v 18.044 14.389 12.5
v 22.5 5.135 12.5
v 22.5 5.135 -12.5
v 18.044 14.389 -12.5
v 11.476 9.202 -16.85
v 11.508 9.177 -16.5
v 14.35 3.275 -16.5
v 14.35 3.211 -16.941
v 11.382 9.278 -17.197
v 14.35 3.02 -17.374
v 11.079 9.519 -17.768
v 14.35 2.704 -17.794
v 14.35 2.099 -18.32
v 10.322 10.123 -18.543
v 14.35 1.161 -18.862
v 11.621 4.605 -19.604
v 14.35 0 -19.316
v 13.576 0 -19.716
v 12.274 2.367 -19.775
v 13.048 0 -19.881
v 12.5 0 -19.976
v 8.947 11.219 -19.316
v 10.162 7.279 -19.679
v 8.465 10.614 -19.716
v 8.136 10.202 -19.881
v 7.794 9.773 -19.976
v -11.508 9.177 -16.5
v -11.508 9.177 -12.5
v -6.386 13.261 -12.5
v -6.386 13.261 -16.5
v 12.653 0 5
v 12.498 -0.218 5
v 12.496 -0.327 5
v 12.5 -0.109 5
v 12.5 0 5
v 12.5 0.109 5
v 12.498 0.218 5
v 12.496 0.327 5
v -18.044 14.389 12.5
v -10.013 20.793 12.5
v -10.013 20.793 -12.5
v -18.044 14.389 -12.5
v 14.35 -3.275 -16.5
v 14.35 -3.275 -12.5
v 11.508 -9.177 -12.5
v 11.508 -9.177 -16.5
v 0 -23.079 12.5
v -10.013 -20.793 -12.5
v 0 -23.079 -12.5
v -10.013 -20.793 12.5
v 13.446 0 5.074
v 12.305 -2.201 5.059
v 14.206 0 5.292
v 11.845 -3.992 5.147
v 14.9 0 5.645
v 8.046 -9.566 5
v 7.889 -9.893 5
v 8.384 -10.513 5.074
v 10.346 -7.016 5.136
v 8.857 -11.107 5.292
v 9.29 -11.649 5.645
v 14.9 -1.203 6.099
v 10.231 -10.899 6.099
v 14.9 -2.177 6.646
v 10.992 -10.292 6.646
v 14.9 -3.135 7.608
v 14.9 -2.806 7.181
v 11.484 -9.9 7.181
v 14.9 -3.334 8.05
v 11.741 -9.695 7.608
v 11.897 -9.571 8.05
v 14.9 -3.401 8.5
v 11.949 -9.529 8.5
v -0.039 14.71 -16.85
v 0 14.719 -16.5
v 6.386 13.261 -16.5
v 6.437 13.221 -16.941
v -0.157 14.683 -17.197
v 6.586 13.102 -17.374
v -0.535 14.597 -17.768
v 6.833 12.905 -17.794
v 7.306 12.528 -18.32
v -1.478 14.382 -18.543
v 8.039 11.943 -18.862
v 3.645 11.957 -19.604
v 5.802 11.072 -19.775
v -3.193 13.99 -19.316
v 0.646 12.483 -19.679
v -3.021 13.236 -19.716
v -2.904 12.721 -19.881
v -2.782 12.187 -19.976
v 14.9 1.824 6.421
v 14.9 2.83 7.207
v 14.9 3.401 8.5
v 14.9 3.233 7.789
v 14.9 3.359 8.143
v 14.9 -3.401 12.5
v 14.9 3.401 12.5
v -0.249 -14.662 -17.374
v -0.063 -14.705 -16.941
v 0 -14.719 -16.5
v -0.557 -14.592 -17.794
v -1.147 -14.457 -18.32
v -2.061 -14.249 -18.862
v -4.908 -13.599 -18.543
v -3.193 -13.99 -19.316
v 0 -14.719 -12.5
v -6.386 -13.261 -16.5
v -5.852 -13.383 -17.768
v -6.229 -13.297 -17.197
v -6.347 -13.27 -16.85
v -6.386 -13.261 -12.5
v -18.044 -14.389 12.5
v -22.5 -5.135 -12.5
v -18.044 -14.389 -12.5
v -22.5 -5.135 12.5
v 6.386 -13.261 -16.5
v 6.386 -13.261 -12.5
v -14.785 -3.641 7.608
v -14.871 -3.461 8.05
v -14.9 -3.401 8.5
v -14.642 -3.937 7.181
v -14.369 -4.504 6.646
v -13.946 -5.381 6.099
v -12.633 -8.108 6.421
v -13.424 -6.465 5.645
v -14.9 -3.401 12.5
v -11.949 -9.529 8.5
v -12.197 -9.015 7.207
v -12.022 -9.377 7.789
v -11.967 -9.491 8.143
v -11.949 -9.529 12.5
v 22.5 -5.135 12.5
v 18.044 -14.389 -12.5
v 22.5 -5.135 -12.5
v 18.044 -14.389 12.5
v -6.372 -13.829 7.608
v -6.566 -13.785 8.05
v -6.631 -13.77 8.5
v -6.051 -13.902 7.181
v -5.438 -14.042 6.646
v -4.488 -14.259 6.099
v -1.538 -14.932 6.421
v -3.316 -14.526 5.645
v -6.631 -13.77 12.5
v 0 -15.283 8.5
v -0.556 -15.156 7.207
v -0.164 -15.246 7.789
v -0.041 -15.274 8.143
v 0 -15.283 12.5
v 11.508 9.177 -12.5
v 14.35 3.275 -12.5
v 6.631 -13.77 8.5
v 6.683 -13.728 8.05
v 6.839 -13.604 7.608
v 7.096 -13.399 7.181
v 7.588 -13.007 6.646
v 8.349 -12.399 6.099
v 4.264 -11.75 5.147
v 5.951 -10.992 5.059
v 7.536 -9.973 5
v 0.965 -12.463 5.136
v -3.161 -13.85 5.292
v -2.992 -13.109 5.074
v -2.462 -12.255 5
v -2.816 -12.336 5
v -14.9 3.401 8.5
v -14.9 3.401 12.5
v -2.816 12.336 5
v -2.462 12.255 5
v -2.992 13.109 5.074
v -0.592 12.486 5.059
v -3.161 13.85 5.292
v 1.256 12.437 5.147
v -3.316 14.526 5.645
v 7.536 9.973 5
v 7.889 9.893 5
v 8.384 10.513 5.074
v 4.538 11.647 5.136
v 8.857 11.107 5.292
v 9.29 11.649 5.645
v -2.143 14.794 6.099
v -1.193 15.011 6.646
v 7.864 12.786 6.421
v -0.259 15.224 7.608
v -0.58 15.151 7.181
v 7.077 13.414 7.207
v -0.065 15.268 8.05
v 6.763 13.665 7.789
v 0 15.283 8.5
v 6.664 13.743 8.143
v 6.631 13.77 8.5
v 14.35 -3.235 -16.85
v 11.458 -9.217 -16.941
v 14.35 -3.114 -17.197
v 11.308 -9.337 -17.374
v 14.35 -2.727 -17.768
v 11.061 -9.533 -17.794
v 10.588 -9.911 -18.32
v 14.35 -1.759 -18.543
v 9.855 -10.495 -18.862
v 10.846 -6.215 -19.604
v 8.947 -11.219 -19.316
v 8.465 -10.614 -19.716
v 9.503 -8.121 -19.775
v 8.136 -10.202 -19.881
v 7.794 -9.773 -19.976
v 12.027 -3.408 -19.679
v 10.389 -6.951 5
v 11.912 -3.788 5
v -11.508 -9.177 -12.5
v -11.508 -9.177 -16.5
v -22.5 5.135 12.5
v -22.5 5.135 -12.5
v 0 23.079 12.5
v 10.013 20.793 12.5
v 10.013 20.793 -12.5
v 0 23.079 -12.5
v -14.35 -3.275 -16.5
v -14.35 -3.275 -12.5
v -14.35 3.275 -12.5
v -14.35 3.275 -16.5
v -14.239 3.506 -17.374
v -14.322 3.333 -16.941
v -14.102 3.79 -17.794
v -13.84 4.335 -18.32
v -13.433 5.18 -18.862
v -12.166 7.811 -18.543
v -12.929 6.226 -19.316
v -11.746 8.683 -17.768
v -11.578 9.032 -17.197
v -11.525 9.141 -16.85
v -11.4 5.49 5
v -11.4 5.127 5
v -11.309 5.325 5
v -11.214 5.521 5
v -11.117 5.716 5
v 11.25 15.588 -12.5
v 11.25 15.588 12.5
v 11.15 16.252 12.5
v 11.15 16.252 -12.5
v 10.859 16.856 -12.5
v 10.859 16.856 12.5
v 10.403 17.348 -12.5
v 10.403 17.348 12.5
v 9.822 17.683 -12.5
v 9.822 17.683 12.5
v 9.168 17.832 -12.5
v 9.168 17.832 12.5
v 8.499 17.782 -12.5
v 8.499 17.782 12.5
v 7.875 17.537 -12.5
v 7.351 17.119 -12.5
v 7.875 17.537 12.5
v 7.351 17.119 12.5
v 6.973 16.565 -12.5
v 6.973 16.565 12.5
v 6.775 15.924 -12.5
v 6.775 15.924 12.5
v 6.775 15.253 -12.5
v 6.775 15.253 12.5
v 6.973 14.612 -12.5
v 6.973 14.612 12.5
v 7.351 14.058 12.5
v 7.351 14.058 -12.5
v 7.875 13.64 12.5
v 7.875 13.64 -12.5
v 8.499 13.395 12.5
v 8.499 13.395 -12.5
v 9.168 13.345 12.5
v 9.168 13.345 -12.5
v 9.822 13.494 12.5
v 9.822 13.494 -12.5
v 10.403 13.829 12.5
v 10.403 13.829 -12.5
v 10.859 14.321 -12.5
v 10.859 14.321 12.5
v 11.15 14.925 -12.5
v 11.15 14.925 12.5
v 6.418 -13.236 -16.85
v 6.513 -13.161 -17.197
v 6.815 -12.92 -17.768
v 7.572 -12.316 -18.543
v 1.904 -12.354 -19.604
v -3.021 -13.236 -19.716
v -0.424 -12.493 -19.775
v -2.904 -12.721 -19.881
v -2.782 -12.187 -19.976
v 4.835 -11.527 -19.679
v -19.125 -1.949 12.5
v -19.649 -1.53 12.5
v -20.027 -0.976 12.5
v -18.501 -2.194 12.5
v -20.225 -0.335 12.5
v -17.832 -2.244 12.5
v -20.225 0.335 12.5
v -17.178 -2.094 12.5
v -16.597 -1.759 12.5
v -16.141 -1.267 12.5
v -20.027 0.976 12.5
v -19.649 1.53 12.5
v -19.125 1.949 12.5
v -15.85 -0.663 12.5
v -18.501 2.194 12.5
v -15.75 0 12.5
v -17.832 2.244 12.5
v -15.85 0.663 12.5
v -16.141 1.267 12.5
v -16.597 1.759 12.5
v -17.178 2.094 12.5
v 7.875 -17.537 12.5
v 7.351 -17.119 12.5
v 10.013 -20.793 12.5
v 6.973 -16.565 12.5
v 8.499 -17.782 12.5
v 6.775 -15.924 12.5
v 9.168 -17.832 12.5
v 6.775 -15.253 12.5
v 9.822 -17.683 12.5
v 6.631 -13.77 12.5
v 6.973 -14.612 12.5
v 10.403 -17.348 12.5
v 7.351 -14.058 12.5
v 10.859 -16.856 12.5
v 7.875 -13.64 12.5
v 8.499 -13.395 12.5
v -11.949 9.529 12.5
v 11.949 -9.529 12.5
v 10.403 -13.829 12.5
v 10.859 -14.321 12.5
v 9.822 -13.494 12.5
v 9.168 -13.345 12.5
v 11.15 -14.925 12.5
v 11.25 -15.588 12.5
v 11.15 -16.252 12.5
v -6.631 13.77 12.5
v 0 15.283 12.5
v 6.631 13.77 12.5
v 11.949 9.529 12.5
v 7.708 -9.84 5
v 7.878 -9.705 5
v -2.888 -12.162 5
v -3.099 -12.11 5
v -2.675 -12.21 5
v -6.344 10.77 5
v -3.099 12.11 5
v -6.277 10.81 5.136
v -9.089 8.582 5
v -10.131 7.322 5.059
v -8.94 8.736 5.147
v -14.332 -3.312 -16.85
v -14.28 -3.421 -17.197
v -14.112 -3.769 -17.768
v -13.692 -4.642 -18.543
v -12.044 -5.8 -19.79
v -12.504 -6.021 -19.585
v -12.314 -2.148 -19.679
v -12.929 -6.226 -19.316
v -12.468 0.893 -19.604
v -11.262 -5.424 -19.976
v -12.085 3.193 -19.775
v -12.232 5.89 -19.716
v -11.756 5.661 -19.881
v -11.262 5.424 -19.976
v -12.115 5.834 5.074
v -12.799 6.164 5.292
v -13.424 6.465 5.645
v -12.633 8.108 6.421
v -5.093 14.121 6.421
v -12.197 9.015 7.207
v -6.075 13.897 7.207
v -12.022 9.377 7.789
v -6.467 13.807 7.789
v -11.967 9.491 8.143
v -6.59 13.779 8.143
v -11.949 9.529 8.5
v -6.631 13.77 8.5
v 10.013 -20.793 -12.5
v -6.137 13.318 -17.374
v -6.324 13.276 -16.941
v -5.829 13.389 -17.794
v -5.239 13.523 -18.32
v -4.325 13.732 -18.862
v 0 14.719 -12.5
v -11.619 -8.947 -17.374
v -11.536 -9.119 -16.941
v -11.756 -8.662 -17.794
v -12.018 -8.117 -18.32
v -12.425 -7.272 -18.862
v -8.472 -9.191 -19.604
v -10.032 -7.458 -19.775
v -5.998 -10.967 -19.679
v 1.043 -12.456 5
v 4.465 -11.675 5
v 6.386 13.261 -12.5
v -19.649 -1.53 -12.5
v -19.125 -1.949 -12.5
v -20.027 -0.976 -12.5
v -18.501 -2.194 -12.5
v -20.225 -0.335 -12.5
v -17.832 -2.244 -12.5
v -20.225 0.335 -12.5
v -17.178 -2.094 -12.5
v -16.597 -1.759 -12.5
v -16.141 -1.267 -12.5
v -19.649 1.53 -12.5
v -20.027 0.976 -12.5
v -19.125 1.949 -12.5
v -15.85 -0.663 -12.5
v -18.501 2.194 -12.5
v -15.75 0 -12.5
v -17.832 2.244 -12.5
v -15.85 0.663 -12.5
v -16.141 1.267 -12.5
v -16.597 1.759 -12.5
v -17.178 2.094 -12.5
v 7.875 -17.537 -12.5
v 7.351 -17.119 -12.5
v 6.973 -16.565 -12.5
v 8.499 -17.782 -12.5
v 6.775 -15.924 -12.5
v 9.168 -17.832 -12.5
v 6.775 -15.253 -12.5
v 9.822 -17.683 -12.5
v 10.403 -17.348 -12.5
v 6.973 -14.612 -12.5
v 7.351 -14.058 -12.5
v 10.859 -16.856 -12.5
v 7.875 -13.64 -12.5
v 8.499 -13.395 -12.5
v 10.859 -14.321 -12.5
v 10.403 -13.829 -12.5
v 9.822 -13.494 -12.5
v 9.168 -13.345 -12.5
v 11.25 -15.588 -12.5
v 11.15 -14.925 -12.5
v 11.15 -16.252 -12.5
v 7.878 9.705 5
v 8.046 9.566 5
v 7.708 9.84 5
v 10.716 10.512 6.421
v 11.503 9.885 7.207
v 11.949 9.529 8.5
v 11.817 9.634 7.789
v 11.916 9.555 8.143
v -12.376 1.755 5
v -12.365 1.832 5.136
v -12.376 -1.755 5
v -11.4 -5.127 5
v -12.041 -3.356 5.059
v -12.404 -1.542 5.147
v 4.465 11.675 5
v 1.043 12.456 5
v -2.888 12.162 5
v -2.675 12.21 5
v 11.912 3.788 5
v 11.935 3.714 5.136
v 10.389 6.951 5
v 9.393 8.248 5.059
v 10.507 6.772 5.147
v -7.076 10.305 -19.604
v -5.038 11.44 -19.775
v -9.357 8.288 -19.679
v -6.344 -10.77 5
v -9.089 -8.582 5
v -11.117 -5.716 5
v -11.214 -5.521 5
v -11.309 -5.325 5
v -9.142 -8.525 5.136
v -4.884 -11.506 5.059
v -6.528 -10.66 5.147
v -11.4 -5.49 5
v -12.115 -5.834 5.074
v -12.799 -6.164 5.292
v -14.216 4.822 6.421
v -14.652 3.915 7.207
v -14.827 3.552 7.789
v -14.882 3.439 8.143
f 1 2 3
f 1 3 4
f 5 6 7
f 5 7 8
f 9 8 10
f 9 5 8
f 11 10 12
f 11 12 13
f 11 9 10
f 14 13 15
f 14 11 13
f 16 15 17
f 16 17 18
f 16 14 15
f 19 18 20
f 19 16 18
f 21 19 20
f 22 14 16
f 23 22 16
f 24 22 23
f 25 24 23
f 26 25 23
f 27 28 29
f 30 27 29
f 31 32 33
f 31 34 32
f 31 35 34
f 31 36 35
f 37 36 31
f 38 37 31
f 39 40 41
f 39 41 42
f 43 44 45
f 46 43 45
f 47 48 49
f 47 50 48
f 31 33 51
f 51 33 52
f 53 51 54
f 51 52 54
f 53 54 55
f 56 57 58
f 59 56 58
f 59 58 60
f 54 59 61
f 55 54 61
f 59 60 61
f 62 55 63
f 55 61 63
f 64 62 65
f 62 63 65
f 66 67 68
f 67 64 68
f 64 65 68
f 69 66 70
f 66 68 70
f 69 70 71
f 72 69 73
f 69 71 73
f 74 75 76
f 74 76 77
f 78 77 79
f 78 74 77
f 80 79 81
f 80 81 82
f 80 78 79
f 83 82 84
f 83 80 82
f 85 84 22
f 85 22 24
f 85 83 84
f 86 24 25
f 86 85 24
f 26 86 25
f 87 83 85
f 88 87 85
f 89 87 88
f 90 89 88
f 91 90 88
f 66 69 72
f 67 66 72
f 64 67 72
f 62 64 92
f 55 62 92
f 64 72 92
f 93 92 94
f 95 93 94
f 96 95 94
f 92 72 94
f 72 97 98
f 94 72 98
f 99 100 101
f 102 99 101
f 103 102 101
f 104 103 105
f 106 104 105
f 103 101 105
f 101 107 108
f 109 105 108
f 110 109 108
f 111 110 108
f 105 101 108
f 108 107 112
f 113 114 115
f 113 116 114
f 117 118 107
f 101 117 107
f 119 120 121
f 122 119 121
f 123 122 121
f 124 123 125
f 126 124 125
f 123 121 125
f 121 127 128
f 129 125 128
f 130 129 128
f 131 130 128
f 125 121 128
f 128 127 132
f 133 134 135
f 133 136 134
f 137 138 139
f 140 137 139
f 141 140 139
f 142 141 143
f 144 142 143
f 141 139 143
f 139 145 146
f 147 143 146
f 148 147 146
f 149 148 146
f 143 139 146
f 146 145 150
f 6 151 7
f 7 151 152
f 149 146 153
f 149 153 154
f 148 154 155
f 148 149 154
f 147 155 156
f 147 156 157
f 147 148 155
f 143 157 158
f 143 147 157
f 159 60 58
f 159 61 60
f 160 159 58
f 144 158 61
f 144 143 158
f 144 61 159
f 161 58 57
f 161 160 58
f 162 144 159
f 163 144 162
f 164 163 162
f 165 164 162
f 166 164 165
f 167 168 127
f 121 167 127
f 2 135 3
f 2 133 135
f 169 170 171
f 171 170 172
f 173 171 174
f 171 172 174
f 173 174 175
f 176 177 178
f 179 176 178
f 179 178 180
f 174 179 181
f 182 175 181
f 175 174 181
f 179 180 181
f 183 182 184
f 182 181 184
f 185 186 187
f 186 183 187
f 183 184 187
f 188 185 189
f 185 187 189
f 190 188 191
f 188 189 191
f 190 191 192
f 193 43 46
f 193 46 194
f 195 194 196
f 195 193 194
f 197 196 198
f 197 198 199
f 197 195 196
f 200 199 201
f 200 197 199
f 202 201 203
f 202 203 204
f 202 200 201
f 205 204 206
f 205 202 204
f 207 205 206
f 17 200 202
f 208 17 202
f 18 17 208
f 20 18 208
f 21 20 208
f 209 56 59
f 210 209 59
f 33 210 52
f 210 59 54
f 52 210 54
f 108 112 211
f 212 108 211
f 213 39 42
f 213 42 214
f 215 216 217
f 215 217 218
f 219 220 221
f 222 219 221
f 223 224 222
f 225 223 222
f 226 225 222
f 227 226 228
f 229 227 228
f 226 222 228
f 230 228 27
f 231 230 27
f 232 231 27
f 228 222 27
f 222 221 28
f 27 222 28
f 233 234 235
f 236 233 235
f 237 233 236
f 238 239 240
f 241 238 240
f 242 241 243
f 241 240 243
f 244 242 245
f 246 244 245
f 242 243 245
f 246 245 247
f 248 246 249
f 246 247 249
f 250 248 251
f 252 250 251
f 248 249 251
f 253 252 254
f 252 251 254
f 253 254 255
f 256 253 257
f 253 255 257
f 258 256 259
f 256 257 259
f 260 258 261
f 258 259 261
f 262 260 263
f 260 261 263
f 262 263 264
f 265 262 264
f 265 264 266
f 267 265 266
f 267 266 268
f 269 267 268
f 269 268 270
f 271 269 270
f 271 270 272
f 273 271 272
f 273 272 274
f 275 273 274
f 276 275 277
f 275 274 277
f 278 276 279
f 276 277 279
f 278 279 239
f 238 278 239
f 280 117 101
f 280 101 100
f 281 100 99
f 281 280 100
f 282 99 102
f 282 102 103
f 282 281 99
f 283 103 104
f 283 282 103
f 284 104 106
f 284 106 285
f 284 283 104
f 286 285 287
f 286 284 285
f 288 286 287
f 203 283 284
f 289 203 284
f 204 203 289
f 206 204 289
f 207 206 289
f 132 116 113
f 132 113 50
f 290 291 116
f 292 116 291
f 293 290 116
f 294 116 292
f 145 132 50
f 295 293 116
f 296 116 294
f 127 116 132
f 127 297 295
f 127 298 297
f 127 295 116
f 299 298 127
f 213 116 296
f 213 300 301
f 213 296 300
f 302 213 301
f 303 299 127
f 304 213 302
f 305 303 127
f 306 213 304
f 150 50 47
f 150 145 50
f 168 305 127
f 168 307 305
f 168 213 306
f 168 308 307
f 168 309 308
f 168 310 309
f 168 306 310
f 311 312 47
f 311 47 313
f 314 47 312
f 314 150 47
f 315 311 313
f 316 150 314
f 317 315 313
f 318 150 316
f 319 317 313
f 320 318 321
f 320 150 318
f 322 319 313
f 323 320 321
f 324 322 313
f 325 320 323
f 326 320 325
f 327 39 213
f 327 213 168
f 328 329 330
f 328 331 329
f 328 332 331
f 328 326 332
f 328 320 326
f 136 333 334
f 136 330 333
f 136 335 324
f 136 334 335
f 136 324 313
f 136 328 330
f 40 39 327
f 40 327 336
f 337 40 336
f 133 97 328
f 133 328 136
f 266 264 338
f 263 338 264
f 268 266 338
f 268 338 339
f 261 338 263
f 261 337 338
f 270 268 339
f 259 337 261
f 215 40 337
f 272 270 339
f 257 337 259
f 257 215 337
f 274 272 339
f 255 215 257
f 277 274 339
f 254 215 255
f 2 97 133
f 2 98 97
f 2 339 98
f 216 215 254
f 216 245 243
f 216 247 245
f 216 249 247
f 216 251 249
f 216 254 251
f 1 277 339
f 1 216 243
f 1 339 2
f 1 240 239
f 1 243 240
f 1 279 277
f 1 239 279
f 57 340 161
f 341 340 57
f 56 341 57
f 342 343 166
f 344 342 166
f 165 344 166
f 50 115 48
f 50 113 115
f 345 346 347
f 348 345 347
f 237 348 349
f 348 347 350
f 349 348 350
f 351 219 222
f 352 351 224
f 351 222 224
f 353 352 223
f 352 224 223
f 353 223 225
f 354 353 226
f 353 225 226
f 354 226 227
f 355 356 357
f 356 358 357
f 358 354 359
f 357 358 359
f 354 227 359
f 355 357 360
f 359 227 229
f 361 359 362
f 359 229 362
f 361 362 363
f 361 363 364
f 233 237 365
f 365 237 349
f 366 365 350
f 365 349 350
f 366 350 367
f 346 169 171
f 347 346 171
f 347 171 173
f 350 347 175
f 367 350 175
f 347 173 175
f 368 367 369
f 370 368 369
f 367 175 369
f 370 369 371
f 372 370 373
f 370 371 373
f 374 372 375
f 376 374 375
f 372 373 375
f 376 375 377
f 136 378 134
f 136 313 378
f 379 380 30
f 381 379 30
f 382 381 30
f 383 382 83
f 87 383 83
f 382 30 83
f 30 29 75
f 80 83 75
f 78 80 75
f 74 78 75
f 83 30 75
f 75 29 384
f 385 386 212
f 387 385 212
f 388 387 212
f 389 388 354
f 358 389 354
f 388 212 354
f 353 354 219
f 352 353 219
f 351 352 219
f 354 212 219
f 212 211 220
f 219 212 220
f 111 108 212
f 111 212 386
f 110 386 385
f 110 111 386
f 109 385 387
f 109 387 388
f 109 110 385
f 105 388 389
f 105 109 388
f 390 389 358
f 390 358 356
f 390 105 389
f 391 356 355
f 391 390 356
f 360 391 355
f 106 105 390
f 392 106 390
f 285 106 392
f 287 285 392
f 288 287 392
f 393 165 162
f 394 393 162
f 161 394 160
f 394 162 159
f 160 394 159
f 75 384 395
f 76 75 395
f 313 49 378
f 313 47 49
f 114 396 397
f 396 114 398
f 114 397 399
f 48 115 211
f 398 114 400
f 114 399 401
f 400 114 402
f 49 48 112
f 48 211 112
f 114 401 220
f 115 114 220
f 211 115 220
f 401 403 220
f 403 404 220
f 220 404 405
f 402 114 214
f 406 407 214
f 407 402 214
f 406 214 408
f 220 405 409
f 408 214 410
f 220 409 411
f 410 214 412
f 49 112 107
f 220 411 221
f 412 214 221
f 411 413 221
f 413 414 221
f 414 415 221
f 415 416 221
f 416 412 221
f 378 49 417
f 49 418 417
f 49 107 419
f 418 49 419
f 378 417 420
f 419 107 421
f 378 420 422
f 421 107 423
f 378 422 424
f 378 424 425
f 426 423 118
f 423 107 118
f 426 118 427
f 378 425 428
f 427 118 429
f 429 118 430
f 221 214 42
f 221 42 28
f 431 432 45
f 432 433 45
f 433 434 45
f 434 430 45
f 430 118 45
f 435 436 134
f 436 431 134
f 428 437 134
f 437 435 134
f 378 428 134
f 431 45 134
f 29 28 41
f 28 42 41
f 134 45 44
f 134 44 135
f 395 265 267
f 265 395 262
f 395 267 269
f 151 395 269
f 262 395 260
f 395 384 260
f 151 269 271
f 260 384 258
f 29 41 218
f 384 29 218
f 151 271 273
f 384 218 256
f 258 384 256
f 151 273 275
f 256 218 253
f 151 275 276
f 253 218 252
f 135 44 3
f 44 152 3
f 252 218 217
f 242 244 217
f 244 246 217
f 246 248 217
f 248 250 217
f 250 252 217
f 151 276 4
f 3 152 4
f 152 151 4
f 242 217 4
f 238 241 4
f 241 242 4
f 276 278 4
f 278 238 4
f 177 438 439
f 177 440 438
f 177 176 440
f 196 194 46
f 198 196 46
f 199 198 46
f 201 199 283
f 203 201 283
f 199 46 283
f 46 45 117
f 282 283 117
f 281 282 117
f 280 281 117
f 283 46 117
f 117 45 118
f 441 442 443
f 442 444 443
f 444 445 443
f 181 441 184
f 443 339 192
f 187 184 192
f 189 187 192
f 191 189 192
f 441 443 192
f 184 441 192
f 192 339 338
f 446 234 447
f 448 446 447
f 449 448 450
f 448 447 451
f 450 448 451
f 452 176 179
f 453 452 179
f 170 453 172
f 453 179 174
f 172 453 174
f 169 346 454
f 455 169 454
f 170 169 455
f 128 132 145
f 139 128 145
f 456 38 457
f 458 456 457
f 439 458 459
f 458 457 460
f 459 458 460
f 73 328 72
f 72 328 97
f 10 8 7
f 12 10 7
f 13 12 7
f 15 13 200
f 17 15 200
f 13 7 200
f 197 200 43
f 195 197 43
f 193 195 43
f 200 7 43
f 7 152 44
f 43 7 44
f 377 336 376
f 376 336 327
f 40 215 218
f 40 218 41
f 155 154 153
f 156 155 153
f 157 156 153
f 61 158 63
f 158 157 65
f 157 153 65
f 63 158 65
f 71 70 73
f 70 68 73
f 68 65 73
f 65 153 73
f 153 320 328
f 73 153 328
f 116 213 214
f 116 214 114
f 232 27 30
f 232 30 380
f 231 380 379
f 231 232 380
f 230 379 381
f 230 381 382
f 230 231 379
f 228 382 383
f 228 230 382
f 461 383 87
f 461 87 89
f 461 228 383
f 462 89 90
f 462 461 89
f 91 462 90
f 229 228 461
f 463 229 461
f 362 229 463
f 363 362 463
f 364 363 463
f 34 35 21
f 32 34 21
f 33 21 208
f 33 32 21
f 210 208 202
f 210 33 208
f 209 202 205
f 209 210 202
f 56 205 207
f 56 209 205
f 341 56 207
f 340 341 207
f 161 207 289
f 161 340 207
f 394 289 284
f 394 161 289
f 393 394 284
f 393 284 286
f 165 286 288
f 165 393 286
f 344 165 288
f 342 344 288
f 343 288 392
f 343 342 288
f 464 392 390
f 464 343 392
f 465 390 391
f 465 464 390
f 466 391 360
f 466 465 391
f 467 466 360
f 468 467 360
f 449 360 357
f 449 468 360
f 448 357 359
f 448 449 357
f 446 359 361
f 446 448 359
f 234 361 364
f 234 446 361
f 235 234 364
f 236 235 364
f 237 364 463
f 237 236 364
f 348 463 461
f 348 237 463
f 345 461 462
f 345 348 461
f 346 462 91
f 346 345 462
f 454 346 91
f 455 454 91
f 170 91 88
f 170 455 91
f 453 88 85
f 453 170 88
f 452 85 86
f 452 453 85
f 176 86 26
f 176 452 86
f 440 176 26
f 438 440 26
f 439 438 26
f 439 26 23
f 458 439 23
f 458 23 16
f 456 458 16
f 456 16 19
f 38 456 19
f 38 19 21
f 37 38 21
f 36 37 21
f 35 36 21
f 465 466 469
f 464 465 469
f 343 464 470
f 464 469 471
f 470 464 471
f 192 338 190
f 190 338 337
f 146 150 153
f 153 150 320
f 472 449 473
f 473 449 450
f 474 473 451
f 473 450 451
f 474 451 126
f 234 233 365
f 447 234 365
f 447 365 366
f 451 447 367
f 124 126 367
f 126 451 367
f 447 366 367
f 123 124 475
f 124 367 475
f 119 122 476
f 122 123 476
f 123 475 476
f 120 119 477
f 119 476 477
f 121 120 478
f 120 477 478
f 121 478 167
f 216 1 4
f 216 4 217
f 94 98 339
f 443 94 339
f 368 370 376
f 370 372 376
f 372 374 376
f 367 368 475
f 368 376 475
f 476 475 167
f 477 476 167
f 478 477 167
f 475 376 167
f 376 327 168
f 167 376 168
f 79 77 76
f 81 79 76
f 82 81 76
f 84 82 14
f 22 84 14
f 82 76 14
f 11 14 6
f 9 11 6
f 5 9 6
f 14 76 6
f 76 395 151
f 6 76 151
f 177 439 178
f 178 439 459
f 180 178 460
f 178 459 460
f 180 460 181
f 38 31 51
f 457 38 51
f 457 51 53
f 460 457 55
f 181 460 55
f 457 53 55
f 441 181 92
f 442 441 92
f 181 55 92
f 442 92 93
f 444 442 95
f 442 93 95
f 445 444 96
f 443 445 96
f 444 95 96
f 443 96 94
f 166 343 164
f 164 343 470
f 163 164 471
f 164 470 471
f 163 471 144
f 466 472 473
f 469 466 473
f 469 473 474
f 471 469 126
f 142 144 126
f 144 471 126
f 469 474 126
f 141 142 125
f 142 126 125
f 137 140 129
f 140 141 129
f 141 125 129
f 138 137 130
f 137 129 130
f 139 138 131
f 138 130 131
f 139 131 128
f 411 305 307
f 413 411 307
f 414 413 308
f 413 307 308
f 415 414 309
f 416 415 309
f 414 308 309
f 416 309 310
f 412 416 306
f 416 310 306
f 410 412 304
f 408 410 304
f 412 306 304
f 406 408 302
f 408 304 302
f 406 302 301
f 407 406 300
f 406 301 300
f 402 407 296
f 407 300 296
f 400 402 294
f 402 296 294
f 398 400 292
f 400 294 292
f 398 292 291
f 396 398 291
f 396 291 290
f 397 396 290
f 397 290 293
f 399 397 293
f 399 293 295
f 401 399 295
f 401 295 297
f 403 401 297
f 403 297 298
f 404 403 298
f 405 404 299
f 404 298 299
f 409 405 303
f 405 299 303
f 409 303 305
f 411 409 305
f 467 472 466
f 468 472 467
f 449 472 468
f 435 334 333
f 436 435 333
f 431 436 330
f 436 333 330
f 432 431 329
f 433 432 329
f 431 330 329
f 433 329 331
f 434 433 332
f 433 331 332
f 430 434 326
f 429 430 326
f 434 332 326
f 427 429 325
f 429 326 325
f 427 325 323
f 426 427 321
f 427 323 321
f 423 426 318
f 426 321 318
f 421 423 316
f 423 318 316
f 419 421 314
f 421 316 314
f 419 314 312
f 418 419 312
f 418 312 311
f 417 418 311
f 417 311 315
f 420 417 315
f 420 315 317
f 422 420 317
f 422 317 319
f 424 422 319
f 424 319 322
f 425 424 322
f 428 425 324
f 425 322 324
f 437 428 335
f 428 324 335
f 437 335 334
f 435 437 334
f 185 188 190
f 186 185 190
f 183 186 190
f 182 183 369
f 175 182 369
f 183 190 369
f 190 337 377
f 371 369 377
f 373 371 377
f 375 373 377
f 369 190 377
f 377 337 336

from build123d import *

# Parameters (mm, degrees)
F0_R         = 12.5
F1_DEPTH     = 12.5
F2_R         = 2.25
F3_DEPTH     = 25
F4_R         = 12.5
F5_DEPTH     = 7.5
F6_R         = 12.5
F7_DEPTH     = 7.5
F8_T4_DEPTH  = 24.3016555368
F8_S5_R      = 12.5
F8_T6_DEPTH  = 15
F8_T11_DEPTH = 24.3016555368
F8_S12_R     = 12.5
F8_T13_DEPTH = 14
F8_T17_DEPTH = 24.3016555368
F8_S18_R     = 12.5
F8_T19_DEPTH = 15
F8_T24_DEPTH = 24.3016555368
F8_S25_R     = 12.5
F8_T26_DEPTH = 15
F8_T30_DEPTH = 24.3016555368
F8_S31_R     = 12.5
F8_T32_DEPTH = 15
F8_T37_DEPTH = 24.3016555368
F8_S38_R     = 12.5
F8_T39_DEPTH = 15
F8_T44_DEPTH = 24.3016555368
F8_S45_R     = 12.5
F8_T46_DEPTH = 15
F9_T1_DEPTH  = 24.050587715
F9_T3_DEPTH  = 24.050587715
F9_T5_DEPTH  = 24.050587715
F9_T7_DEPTH  = 24.050587715
F9_T9_DEPTH  = 24.050587715
F9_T11_DEPTH = 24.050587715
F9_T13_DEPTH = 24.050587715


# Not quite as in the source:
# - a fillet or chamfer that OpenCascade refuses, or shapes differently, is made with other operations: its cross-section is extruded or revolved along the edge and cut away or added


with BuildPart() as f1:
    # F0 (on Top) → F1 (new body, symmetric)
    with BuildSketch(Plane.XY):
        Polygon((22.5, -5.1354781738), (22.5, 5.1354781738), (18.0435990556, 14.3892900865), (10.013442028, 20.7931266245), (0, 23.0786294236), (-10.013442028, 20.7931266245), (-18.0435990556, 14.3892900865), (-22.5, 5.1354781738), (-22.5, -5.1354781738), (-18.0435990556, -14.3892900865), (-10.013442028, -20.7931266245), (0, -23.0786294236), (10.013442028, -20.7931266245), (18.0435990556, -14.3892900865), align=None)
        Circle(F0_R, mode=Mode.SUBTRACT)
    extrude(amount=F1_DEPTH, both=True)

    # F2 (on face) → F3 (cut)
    with BuildSketch(Plane.XY.offset(12.5)):
        with Locations((9, 15.5884572681)):
            Circle(F2_R)
        with Locations((-18, 0)):
            Circle(F2_R)
        with Locations((9, -15.5884572681)):
            Circle(F2_R)
    extrude(amount=-F3_DEPTH, mode=Mode.SUBTRACT)

    # F4 (on face) → F5 (cut)
    with BuildSketch(Plane.XY.offset(12.5)):
        Polygon((14.9, -3.4008277684), (14.9, 3.4008277684), (11.9488722635, 9.5289076573), (6.6311238319, 13.7696705203), (0, 15.2831812628), (-6.6311238319, 13.7696705203), (-11.9488722635, 9.5289076573), (-14.9, 3.4008277684), (-14.9, -3.4008277684), (-11.9488722635, -9.5289076573), (-6.6311238319, -13.7696705203), (0, -15.2831812628), (6.6311238319, -13.7696705203), (11.9488722635, -9.5289076573), align=None)
        Circle(F4_R, mode=Mode.SUBTRACT)
    extrude(amount=-F5_DEPTH, mode=Mode.SUBTRACT)

    # F6 (on face) → F7 (join)
    with BuildSketch(Plane(origin=(0, 0, -12.5), x_dir=(1, 0, 0), z_dir=(0, 0, -1))):
        Polygon((14.35, -3.2752938575), (14.35, 3.2752938575), (11.5078065088, 9.1771694552), (6.3863508045, 13.2613940917), (0, 14.719036988), (-6.3863508045, 13.2613940917), (-11.5078065088, 9.1771694552), (-14.35, 3.2752938575), (-14.35, -3.2752938575), (-11.5078065088, -9.1771694552), (-6.3863508045, -13.2613940917), (0, -14.719036988), (6.3863508045, -13.2613940917), (11.5078065088, -9.1771694552), align=None)
        Circle(F6_R, mode=Mode.SUBTRACT)
    extrude(amount=F7_DEPTH)

    # F8: fillet of radius 3.5 on 7 edges, made by hand


with BuildPart() as f8_tool2:
    # F8_s3 → F8_t4 (new body)
    with BuildSketch(Plane(origin=(9.4998996874, 7.5759171977, 0), x_dir=(0, 0, 1), z_dir=(-0.7818314825, -0.6234898019, 0))):
        with BuildLine():
            ThreePointArc((5, 11.4), (6.0251262658, 13.8748737342), (8.5, 14.9))
            Line((8.5, 14.9), (5, 14.9))
            Line((5, 14.9), (5, 11.4))
        make_face()
    extrude(amount=F8_T4_DEPTH)

    # F8_s5 → F8_t6 (cut, symmetric)
    with BuildSketch(Plane.XY.offset(6.8)):
        Circle(F8_S5_R)
    extrude(amount=F8_T6_DEPTH, both=True, mode=Mode.SUBTRACT)

    split(bisect_by=Plane(origin=(-13.4244361317, 6.4648677129, 0), x_dir=(0, 0, 1), z_dir=(0.9009688679, -0.4338837391, 0)), keep=Keep.TOP)


with BuildPart() as f1_1:
    add(f1.part)

    # F8_t1: union F8_tool2
    add(f8_tool2.part)


with BuildPart() as f8_tool9:
    # F8_s10 → F8_t11 (new body)
    with BuildSketch(Plane.XZ.offset(-12.1508277684)):
        with BuildLine():
            ThreePointArc((-11.4, 5), (-13.8748737342, 6.0251262658), (-14.9, 8.5))
            Line((-14.9, 8.5), (-14.9, 5))
            Line((-14.9, 5), (-11.4, 5))
        make_face()
    extrude(amount=F8_T11_DEPTH)

    # F8_s12 → F8_t13 (cut, symmetric)
    with BuildSketch(Plane.XY.offset(6.8)):
        Circle(F8_S12_R)
    extrude(amount=F8_T13_DEPTH, both=True, mode=Mode.SUBTRACT)


with BuildPart() as f1_2:
    add(f1_1.part)

    # F8_t8: union F8_tool9
    add(f8_tool9.part)


with BuildPart() as f8_tool15:
    # F8_s16 → F8_t17 (new body)
    with BuildSketch(Plane(origin=(-9.4998996874, 7.5759171977, 0), x_dir=(0, 0, 1), z_dir=(0.7818314825, -0.6234898019, 0))):
        with BuildLine():
            ThreePointArc((5, 11.4), (6.0251262658, 13.8748737342), (8.5, 14.9))
            Line((8.5, 14.9), (5, 14.9))
            Line((5, 14.9), (5, 11.4))
        make_face()
    extrude(amount=F8_T17_DEPTH)

    # F8_s18 → F8_t19 (cut, symmetric)
    with BuildSketch(Plane.XY.offset(6.8)):
        Circle(F8_S18_R)
    extrude(amount=F8_T19_DEPTH, both=True, mode=Mode.SUBTRACT)

    split(bisect_by=Plane.YZ.offset(-14.9), keep=Keep.TOP)


with BuildPart() as f1_3:
    add(f1_2.part)

    # F8_t14: union F8_tool15
    add(f8_tool15.part)


with BuildPart() as f8_tool22:
    # F8_s23 → F8_t24 (new body)
    with BuildSketch(Plane(origin=(-11.8461811475, -2.7038135434, 0), x_dir=(0, 0, 1), z_dir=(0.9749279122, 0.222520934, 0))):
        with BuildLine():
            ThreePointArc((8.5, 14.9), (6.0251262658, 13.8748737342), (5, 11.4))
            Line((5, 11.4), (5, 14.9))
            Line((5, 14.9), (8.5, 14.9))
        make_face()
    extrude(amount=F8_T24_DEPTH)

    # F8_s25 → F8_t26 (cut, symmetric)
    with BuildSketch(Plane.XY.offset(6.8)):
        Circle(F8_S25_R)
    extrude(amount=F8_T26_DEPTH, both=True, mode=Mode.SUBTRACT)


with BuildPart() as f1_4:
    add(f1_3.part)

    # F8_t21: union F8_tool22
    add(f8_tool22.part)


with BuildPart() as f8_tool28:
    # F8_s29 → F8_t30 (new body)
    with BuildSketch(Plane(origin=(-5.2720465855, -10.9475175386, 0), x_dir=(0, 0, 1), z_dir=(0.4338837391, 0.9009688679, 0))):
        with BuildLine():
            ThreePointArc((5, 11.4), (6.0251262658, 13.8748737342), (8.5, 14.9))
            Line((8.5, 14.9), (5, 14.9))
            Line((5, 14.9), (5, 11.4))
        make_face()
    extrude(amount=F8_T30_DEPTH)

    # F8_s31 → F8_t32 (cut, symmetric)
    with BuildSketch(Plane.XY.offset(6.8)):
        Circle(F8_S31_R)
    extrude(amount=F8_T32_DEPTH, both=True, mode=Mode.SUBTRACT)

    split(bisect_by=Plane(origin=(9.2899980477, -11.6492890888, 0), x_dir=(0, 0, 1), z_dir=(-0.6234898019, 0.7818314825, 0)), keep=Keep.TOP)


with BuildPart() as f1_5:
    add(f1_4.part)

    # F8_t27: union F8_tool28
    add(f8_tool28.part)


with BuildPart() as f8_tool35:
    # F8_s36 → F8_t37 (new body)
    with BuildSketch(Plane(origin=(5.2720465855, -10.9475175386, 0), x_dir=(0, 0, 1), z_dir=(-0.4338837391, 0.9009688679, 0))):
        with BuildLine():
            ThreePointArc((5, 11.4), (6.0251262658, 13.8748737342), (8.5, 14.9))
            Line((8.5, 14.9), (5, 14.9))
            Line((5, 14.9), (5, 11.4))
        make_face()
    extrude(amount=F8_T37_DEPTH)

    # F8_s38 → F8_t39 (cut, symmetric)
    with BuildSketch(Plane.XY.offset(6.8)):
        Circle(F8_S38_R)
    extrude(amount=F8_T39_DEPTH, both=True, mode=Mode.SUBTRACT)

    split(bisect_by=Plane(origin=(9.2899980477, 11.6492890888, 0), x_dir=(0, 0, 1), z_dir=(-0.6234898019, -0.7818314825, 0)), keep=Keep.TOP)


with BuildPart() as f1_6:
    add(f1_5.part)

    # F8_t34: union F8_tool35
    add(f8_tool35.part)


with BuildPart() as f8_tool42:
    # F8_s43 → F8_t44 (new body)
    with BuildSketch(Plane(origin=(11.8461811475, -2.7038135434, 0), x_dir=(0, 0, 1), z_dir=(-0.9749279122, 0.222520934, 0))):
        with BuildLine():
            ThreePointArc((5, 11.4), (6.0251262658, 13.8748737342), (8.5, 14.9))
            Line((8.5, 14.9), (5, 14.9))
            Line((5, 14.9), (5, 11.4))
        make_face()
    extrude(amount=F8_T44_DEPTH)

    # F8_s45 → F8_t46 (cut, symmetric)
    with BuildSketch(Plane.XY.offset(6.8)):
        Circle(F8_S45_R)
    extrude(amount=F8_T46_DEPTH, both=True, mode=Mode.SUBTRACT)


with BuildPart() as f1_7:
    add(f1_6.part)

    # F8_t41: union F8_tool42
    add(f8_tool42.part)

    # F9: fillet of radius 3.5 on 7 edges, made by hand

    # F9_s2 → F9_t1 (cut)
    with BuildSketch(Plane(origin=(-5.2175794629, 10.834415393, 0), x_dir=(0, 0, 1), z_dir=(0.4338837391, -0.9009688679, 0))):
        with BuildLine():
            ThreePointArc((-16.5, -14.35), (-18.9748737342, -13.3248737342), (-20, -10.85))
            Line((-20, -10.85), (-20, -14.35))
            Line((-20, -14.35), (-16.5, -14.35))
        make_face()
    extrude(amount=F9_T1_DEPTH, mode=Mode.SUBTRACT)

    # F9_s4 → F9_t3 (cut)
    with BuildSketch(Plane(origin=(-11.7237946339, 2.6758796203, 0), x_dir=(0, 0, 1), z_dir=(0.9749279122, -0.222520934, 0))):
        with BuildLine():
            ThreePointArc((-16.5, -14.35), (-18.9748737342, -13.3248737342), (-20, -10.85))
            Line((-20, -10.85), (-20, -14.35))
            Line((-20, -14.35), (-16.5, -14.35))
        make_face()
    extrude(amount=F9_T3_DEPTH, mode=Mode.SUBTRACT)

    # F9_s6 → F9_t5 (cut)
    with BuildSketch(Plane(origin=(-9.4017533237, -7.4976480845, 0), x_dir=(0, 0, 1), z_dir=(0.7818314825, 0.6234898019, 0))):
        with BuildLine():
            ThreePointArc((-16.5, -14.35), (-18.9748737342, -13.3248737342), (-20, -10.85))
            Line((-20, -10.85), (-20, -14.35))
            Line((-20, -14.35), (-16.5, -14.35))
        make_face()
    extrude(amount=F9_T5_DEPTH, mode=Mode.SUBTRACT)

    # F9_s8 → F9_t7 (cut)
    with BuildSketch(Plane.XZ.offset(-12.0252938575)):
        with BuildLine():
            ThreePointArc((-14.35, -16.5), (-13.3248737342, -18.9748737342), (-10.85, -20))
            Line((-10.85, -20), (-14.35, -20))
            Line((-14.35, -20), (-14.35, -16.5))
        make_face()
    extrude(amount=F9_T7_DEPTH, mode=Mode.SUBTRACT)

    # F9_s10 → F9_t9 (cut)
    with BuildSketch(Plane(origin=(9.4017533237, -7.4976480845, 0), x_dir=(0, 0, 1), z_dir=(-0.7818314825, 0.6234898019, 0))):
        with BuildLine():
            ThreePointArc((-16.5, -14.35), (-18.9748737342, -13.3248737342), (-20, -10.85))
            Line((-20, -10.85), (-20, -14.35))
            Line((-20, -14.35), (-16.5, -14.35))
        make_face()
    extrude(amount=F9_T9_DEPTH, mode=Mode.SUBTRACT)

    # F9_s12 → F9_t11 (cut)
    with BuildSketch(Plane(origin=(11.7237946339, 2.6758796203, 0), x_dir=(0, 0, 1), z_dir=(-0.9749279122, -0.222520934, 0))):
        with BuildLine():
            ThreePointArc((-16.5, -14.35), (-18.9748737342, -13.3248737342), (-20, -10.85))
            Line((-20, -10.85), (-20, -14.35))
            Line((-20, -14.35), (-16.5, -14.35))
        make_face()
    extrude(amount=F9_T11_DEPTH, mode=Mode.SUBTRACT)

    # F9_s14 → F9_t13 (cut)
    with BuildSketch(Plane(origin=(5.2175794629, 10.834415393, 0), x_dir=(0, 0, 1), z_dir=(-0.4338837391, -0.9009688679, 0))):
        with BuildLine():
            ThreePointArc((-16.5, -14.35), (-18.9748737342, -13.3248737342), (-20, -10.85))
            Line((-20, -10.85), (-20, -14.35))
            Line((-20, -14.35), (-16.5, -14.35))
        make_face()
    extrude(amount=F9_T13_DEPTH, mode=Mode.SUBTRACT)


solid = f1_7.part
